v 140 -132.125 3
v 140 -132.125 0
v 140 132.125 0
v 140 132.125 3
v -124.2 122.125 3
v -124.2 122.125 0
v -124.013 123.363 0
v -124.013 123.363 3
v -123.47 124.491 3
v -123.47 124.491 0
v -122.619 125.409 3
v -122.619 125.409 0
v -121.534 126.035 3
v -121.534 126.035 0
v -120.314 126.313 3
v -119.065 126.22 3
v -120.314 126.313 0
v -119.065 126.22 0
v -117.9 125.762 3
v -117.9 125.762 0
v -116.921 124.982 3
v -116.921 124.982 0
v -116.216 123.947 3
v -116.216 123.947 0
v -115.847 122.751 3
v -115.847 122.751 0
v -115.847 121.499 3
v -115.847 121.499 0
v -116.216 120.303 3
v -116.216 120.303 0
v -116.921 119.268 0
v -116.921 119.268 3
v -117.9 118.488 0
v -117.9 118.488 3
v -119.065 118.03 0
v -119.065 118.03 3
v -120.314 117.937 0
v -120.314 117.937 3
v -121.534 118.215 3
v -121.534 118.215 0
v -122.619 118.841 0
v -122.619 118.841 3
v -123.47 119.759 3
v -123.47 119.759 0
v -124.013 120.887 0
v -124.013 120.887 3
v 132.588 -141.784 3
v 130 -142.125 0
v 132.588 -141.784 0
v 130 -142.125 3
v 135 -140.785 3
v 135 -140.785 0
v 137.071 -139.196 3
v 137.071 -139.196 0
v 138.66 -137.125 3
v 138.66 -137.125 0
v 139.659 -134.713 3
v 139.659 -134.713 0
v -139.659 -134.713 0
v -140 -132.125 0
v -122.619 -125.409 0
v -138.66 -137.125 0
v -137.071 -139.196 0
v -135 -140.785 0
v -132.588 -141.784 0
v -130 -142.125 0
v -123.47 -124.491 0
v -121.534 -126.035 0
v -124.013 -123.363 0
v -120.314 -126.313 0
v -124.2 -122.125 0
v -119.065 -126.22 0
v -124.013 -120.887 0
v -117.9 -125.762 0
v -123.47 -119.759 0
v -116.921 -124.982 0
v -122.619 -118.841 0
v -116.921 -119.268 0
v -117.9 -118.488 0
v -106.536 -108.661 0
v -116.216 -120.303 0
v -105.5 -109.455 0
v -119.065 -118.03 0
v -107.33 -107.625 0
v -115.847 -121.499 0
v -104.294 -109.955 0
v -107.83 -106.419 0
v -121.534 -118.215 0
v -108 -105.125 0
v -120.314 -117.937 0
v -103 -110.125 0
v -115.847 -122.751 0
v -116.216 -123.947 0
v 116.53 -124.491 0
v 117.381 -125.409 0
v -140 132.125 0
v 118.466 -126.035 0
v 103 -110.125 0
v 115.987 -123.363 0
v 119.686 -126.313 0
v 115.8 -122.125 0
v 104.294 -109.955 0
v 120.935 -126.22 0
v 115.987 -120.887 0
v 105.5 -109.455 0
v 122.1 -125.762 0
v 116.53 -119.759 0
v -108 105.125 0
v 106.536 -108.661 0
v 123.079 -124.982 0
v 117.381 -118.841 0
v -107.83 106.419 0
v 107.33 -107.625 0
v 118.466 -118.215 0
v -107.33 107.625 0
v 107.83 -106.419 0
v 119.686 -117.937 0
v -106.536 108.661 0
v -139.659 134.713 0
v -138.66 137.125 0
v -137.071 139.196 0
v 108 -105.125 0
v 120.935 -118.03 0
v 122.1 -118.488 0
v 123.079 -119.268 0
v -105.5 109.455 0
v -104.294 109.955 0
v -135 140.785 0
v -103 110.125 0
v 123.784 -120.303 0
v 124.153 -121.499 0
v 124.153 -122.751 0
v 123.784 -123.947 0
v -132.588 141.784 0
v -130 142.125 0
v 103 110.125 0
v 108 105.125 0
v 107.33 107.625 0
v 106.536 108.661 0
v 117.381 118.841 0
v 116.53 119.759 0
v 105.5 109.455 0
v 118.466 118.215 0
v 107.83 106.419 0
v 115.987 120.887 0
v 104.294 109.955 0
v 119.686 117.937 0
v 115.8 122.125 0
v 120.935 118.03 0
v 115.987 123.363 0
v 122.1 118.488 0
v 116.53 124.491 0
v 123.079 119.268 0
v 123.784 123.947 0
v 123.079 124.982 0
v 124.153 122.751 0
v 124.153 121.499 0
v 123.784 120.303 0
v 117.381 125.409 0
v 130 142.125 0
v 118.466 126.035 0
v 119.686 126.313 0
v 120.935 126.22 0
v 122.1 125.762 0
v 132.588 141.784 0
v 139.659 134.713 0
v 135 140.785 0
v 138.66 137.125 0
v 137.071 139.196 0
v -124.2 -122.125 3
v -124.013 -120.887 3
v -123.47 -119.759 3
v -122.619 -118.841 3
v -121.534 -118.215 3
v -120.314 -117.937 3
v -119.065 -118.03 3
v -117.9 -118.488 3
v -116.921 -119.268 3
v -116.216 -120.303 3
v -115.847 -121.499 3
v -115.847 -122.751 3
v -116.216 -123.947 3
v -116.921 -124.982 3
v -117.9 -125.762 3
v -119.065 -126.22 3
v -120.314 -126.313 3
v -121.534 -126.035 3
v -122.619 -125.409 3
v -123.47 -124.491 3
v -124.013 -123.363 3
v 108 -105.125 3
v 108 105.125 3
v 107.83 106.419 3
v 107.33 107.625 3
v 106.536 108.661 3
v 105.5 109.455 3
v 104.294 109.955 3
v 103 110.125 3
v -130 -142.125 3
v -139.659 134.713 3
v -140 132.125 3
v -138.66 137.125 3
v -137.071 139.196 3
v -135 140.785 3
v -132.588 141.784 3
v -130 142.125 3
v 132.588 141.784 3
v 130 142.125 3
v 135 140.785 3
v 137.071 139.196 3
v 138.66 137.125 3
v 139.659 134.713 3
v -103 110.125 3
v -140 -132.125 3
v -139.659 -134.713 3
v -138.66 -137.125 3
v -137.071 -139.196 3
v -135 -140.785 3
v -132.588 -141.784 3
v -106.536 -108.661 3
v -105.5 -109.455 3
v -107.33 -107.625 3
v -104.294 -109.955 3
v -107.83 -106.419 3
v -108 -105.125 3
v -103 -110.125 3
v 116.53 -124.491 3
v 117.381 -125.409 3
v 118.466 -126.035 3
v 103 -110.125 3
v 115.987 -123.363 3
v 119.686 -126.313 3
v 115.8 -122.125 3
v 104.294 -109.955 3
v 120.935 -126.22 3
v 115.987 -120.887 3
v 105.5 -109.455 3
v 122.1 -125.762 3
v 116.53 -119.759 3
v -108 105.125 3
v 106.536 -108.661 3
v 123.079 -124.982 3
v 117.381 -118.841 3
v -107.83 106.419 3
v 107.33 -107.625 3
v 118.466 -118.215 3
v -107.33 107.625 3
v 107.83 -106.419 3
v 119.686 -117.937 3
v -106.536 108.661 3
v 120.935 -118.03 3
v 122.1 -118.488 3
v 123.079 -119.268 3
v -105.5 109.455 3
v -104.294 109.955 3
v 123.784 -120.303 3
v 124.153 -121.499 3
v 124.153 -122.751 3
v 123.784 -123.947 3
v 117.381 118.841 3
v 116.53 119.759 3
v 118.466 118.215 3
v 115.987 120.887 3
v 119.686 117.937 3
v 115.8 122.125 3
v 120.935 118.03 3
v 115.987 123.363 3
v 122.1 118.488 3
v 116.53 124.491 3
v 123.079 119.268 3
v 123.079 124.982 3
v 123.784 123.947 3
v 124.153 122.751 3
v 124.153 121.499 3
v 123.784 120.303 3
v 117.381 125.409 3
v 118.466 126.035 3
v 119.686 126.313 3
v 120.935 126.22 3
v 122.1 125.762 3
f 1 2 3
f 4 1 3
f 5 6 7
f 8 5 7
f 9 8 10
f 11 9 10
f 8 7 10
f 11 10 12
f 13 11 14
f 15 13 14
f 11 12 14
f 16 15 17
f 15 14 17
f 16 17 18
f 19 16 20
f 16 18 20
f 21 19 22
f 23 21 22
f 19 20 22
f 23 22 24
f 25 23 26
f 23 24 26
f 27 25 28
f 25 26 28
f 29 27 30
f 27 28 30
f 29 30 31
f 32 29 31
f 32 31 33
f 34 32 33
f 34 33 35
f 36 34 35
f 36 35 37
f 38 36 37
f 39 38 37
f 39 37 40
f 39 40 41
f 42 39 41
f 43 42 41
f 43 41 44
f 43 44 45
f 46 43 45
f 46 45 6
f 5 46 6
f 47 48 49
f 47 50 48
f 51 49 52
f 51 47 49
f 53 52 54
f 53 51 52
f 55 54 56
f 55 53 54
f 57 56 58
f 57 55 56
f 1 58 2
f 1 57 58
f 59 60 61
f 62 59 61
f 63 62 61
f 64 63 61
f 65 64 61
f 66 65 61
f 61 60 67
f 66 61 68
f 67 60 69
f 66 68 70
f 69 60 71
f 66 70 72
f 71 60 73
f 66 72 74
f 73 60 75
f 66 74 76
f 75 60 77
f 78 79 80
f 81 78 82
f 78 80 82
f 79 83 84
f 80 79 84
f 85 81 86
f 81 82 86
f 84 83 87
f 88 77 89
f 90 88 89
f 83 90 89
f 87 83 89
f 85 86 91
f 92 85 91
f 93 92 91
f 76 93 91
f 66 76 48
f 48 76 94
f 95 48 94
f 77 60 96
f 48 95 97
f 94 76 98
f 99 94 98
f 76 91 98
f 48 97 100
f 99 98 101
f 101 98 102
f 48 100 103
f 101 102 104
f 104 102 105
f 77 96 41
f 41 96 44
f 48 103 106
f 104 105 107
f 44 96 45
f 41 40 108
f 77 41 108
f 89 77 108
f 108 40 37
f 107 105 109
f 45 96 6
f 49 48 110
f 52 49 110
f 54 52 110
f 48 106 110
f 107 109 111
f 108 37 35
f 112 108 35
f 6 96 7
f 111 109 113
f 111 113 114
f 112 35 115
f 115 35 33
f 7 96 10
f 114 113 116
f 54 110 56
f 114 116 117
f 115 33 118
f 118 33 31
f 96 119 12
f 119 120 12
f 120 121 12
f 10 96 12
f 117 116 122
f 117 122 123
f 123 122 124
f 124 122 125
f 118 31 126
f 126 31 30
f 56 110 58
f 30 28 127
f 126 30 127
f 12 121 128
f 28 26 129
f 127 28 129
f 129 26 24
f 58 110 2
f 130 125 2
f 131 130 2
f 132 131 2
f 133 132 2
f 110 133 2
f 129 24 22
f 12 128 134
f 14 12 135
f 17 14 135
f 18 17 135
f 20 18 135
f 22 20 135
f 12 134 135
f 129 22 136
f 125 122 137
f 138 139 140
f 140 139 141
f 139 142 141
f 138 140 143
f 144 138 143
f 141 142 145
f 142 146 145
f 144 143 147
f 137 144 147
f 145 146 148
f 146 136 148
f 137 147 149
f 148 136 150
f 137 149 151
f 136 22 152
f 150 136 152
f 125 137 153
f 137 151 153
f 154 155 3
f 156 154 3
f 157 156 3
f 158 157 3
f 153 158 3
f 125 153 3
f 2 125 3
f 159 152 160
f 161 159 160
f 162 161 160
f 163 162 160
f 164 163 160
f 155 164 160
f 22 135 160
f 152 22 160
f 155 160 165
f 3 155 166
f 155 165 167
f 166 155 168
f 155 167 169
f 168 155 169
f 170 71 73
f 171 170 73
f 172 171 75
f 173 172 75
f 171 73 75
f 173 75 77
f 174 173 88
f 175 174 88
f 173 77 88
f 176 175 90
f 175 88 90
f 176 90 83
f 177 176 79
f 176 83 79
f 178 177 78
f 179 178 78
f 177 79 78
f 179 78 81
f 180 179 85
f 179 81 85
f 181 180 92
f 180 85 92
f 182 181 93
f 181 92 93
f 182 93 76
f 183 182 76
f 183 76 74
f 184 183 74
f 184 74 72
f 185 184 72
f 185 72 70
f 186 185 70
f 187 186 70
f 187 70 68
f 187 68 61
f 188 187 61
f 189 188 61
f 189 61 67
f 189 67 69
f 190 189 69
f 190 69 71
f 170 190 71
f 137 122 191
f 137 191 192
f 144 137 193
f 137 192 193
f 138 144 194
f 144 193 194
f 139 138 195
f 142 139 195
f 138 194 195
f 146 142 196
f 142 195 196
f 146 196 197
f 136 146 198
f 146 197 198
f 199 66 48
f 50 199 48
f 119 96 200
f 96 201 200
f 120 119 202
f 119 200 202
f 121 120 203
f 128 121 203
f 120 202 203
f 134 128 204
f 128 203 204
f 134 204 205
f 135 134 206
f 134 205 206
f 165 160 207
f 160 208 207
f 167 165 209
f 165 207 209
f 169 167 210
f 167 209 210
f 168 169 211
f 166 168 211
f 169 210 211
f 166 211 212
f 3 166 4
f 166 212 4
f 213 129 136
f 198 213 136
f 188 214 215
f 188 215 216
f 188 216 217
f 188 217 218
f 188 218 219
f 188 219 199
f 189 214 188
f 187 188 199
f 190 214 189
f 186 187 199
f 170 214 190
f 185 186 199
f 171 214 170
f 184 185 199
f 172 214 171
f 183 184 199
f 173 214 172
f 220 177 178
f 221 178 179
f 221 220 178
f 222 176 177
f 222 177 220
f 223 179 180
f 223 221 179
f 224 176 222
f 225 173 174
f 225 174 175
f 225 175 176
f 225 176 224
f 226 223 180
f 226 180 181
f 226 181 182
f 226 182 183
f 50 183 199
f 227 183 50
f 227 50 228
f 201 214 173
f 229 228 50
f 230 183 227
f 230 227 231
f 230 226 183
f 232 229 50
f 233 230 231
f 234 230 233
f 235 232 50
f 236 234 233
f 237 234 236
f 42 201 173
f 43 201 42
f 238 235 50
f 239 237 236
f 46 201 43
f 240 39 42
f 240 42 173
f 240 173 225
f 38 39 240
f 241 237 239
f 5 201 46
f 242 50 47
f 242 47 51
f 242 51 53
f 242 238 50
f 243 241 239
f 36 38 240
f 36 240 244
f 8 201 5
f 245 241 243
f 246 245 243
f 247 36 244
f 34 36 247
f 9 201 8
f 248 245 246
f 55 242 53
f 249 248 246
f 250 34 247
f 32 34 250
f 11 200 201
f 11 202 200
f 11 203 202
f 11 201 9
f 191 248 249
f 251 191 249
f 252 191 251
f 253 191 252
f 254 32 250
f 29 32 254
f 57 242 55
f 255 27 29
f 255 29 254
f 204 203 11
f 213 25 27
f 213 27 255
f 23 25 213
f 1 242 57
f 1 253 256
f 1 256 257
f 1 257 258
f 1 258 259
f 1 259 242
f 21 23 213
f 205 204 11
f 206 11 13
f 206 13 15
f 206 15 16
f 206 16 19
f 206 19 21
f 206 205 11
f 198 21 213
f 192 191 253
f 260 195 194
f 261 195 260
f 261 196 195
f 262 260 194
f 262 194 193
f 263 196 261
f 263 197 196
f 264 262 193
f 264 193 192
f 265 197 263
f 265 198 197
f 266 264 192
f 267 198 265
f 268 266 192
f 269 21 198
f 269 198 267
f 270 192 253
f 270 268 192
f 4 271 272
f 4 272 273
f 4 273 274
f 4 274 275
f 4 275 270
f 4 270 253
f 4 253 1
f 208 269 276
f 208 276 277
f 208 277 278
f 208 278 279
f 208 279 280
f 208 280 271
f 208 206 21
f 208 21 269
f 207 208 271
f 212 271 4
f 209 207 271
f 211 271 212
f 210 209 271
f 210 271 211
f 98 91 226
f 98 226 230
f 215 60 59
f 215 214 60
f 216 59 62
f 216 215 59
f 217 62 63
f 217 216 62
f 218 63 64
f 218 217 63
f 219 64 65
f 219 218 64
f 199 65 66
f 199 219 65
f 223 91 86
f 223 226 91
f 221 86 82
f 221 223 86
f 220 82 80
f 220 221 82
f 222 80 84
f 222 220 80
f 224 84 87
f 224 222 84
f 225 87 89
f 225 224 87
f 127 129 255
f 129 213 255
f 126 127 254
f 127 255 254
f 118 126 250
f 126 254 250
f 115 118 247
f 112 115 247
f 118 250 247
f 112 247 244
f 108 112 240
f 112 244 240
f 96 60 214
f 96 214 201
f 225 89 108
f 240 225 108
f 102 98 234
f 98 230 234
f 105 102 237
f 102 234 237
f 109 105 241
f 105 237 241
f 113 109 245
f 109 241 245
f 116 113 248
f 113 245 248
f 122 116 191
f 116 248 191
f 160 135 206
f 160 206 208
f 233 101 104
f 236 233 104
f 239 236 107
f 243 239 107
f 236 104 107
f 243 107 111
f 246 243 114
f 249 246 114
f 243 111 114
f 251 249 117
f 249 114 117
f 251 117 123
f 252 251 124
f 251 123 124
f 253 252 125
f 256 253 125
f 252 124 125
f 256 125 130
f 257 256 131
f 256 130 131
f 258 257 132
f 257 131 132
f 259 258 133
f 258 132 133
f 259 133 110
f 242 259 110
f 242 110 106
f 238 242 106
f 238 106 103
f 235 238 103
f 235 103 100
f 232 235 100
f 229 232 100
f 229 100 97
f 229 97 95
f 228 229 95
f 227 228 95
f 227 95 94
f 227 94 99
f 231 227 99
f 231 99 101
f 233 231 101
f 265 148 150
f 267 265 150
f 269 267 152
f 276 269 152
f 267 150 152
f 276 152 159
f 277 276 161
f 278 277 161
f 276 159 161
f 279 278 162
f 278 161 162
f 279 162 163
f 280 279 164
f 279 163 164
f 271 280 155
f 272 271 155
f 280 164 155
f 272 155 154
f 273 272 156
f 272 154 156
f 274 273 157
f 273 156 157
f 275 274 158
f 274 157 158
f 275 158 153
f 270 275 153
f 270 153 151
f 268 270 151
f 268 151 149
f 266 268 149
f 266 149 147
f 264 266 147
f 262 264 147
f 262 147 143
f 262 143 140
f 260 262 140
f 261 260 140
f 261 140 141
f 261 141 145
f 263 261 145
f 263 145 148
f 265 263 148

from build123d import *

# Parameters (mm, degrees)
SKETCH_1_W              = 280
SKETCH_1_H              = 284.25
SKETCH_1_W_2            = 216
SKETCH_1_H_2            = 220.25
EXTRUDE_1_DEPTH         = 3
FILLET_1_R              = 10
FILLET_2_R              = 5
HOLE_WIZARD_8_4_8_4_1_D = 8.4


with BuildPart() as part:
    # 草图1 → 凸台-拉伸1 (new body)
    with BuildSketch(Plane.XY):
        Rectangle(SKETCH_1_W, SKETCH_1_H)
        Rectangle(SKETCH_1_W_2, SKETCH_1_H_2, mode=Mode.SUBTRACT)
    extrude(amount=EXTRUDE_1_DEPTH)

    # 圆角1
    fillet_1_edges = [part.edges().sort_by_distance(p)[0] for p in [
        (140, -142.125, 1.5),
        (-140, -142.125, 1.5),
        (-140, 142.125, 1.5),
        (140, 142.125, 1.5),
    ]]
    fillet(fillet_1_edges, radius=FILLET_1_R)

    # 圆角2
    fillet_2_edges = [part.edges().sort_by_distance(p)[0] for p in [
        (108, -110.125, 1.5),
        (108, 110.125, 1.5),
        (-108, 110.125, 1.5),
        (-108, -110.125, 1.5),
    ]]
    fillet(fillet_2_edges, radius=FILLET_2_R)

    # Ø8.4 (8.4) 直径孔1 (through all)
    with Locations(Plane.XY.offset(3)):
        with Locations((120, -122.125), (-120, 122.125), (-120, -122.125), (120, 122.125)):
            Hole(HOLE_WIZARD_8_4_8_4_1_D / 2)


solid = part.part
